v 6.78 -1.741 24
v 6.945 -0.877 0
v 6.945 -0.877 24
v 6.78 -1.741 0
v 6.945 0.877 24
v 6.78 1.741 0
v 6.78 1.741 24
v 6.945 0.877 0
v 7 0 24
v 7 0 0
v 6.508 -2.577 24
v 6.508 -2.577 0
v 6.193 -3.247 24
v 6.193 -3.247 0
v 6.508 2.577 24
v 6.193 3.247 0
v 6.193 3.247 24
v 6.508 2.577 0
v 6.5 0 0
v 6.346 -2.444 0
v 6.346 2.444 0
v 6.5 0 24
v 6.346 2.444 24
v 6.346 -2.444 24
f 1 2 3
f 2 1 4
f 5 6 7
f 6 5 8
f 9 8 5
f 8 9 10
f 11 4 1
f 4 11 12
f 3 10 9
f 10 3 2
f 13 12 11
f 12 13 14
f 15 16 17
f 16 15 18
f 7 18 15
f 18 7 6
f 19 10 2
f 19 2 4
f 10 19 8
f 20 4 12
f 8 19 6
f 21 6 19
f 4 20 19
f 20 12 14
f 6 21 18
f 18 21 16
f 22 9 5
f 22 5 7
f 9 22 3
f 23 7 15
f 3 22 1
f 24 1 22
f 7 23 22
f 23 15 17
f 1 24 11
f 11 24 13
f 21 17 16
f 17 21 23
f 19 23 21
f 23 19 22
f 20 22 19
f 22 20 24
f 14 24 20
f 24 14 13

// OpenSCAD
$fn = 50;


difference() {
	union() {
		cylinder(h = 24, r = 7.0000000000);
		translate(v = [-16.0000000000, 0, 0]) {
			cylinder(h = 24, r = 7.0000000000);
		}
	}
	union() {
		cylinder(h = 24, r = 3.2500000000);
		cylinder(h = 24, r = 1.8000000000);
		cylinder(h = 24, r = 1.8000000000);
		cylinder(h = 24, r = 1.8000000000);
		translate(v = [-20.5000000000, 0, 0]) {
			hull() {
				translate(v = [-3.7500000000, 0.0000000000, 0]) {
					cylinder(h = 24, r = 10.5000000000);
				}
				translate(v = [3.7500000000, 0.0000000000, 0]) {
					cylinder(h = 24, r = 10.5000000000);
				}
				translate(v = [-3.7500000000, -0.0000000000, 0]) {
					cylinder(h = 24, r = 10.5000000000);
				}
				translate(v = [3.7500000000, -0.0000000000, 0]) {
					cylinder(h = 24, r = 10.5000000000);
				}
			}
		}
		translate(v = [-13.0000000000, 0, 0.0000000000]) {
			cylinder(h = 24, r = 19.5000000000);
		}
	}
}
